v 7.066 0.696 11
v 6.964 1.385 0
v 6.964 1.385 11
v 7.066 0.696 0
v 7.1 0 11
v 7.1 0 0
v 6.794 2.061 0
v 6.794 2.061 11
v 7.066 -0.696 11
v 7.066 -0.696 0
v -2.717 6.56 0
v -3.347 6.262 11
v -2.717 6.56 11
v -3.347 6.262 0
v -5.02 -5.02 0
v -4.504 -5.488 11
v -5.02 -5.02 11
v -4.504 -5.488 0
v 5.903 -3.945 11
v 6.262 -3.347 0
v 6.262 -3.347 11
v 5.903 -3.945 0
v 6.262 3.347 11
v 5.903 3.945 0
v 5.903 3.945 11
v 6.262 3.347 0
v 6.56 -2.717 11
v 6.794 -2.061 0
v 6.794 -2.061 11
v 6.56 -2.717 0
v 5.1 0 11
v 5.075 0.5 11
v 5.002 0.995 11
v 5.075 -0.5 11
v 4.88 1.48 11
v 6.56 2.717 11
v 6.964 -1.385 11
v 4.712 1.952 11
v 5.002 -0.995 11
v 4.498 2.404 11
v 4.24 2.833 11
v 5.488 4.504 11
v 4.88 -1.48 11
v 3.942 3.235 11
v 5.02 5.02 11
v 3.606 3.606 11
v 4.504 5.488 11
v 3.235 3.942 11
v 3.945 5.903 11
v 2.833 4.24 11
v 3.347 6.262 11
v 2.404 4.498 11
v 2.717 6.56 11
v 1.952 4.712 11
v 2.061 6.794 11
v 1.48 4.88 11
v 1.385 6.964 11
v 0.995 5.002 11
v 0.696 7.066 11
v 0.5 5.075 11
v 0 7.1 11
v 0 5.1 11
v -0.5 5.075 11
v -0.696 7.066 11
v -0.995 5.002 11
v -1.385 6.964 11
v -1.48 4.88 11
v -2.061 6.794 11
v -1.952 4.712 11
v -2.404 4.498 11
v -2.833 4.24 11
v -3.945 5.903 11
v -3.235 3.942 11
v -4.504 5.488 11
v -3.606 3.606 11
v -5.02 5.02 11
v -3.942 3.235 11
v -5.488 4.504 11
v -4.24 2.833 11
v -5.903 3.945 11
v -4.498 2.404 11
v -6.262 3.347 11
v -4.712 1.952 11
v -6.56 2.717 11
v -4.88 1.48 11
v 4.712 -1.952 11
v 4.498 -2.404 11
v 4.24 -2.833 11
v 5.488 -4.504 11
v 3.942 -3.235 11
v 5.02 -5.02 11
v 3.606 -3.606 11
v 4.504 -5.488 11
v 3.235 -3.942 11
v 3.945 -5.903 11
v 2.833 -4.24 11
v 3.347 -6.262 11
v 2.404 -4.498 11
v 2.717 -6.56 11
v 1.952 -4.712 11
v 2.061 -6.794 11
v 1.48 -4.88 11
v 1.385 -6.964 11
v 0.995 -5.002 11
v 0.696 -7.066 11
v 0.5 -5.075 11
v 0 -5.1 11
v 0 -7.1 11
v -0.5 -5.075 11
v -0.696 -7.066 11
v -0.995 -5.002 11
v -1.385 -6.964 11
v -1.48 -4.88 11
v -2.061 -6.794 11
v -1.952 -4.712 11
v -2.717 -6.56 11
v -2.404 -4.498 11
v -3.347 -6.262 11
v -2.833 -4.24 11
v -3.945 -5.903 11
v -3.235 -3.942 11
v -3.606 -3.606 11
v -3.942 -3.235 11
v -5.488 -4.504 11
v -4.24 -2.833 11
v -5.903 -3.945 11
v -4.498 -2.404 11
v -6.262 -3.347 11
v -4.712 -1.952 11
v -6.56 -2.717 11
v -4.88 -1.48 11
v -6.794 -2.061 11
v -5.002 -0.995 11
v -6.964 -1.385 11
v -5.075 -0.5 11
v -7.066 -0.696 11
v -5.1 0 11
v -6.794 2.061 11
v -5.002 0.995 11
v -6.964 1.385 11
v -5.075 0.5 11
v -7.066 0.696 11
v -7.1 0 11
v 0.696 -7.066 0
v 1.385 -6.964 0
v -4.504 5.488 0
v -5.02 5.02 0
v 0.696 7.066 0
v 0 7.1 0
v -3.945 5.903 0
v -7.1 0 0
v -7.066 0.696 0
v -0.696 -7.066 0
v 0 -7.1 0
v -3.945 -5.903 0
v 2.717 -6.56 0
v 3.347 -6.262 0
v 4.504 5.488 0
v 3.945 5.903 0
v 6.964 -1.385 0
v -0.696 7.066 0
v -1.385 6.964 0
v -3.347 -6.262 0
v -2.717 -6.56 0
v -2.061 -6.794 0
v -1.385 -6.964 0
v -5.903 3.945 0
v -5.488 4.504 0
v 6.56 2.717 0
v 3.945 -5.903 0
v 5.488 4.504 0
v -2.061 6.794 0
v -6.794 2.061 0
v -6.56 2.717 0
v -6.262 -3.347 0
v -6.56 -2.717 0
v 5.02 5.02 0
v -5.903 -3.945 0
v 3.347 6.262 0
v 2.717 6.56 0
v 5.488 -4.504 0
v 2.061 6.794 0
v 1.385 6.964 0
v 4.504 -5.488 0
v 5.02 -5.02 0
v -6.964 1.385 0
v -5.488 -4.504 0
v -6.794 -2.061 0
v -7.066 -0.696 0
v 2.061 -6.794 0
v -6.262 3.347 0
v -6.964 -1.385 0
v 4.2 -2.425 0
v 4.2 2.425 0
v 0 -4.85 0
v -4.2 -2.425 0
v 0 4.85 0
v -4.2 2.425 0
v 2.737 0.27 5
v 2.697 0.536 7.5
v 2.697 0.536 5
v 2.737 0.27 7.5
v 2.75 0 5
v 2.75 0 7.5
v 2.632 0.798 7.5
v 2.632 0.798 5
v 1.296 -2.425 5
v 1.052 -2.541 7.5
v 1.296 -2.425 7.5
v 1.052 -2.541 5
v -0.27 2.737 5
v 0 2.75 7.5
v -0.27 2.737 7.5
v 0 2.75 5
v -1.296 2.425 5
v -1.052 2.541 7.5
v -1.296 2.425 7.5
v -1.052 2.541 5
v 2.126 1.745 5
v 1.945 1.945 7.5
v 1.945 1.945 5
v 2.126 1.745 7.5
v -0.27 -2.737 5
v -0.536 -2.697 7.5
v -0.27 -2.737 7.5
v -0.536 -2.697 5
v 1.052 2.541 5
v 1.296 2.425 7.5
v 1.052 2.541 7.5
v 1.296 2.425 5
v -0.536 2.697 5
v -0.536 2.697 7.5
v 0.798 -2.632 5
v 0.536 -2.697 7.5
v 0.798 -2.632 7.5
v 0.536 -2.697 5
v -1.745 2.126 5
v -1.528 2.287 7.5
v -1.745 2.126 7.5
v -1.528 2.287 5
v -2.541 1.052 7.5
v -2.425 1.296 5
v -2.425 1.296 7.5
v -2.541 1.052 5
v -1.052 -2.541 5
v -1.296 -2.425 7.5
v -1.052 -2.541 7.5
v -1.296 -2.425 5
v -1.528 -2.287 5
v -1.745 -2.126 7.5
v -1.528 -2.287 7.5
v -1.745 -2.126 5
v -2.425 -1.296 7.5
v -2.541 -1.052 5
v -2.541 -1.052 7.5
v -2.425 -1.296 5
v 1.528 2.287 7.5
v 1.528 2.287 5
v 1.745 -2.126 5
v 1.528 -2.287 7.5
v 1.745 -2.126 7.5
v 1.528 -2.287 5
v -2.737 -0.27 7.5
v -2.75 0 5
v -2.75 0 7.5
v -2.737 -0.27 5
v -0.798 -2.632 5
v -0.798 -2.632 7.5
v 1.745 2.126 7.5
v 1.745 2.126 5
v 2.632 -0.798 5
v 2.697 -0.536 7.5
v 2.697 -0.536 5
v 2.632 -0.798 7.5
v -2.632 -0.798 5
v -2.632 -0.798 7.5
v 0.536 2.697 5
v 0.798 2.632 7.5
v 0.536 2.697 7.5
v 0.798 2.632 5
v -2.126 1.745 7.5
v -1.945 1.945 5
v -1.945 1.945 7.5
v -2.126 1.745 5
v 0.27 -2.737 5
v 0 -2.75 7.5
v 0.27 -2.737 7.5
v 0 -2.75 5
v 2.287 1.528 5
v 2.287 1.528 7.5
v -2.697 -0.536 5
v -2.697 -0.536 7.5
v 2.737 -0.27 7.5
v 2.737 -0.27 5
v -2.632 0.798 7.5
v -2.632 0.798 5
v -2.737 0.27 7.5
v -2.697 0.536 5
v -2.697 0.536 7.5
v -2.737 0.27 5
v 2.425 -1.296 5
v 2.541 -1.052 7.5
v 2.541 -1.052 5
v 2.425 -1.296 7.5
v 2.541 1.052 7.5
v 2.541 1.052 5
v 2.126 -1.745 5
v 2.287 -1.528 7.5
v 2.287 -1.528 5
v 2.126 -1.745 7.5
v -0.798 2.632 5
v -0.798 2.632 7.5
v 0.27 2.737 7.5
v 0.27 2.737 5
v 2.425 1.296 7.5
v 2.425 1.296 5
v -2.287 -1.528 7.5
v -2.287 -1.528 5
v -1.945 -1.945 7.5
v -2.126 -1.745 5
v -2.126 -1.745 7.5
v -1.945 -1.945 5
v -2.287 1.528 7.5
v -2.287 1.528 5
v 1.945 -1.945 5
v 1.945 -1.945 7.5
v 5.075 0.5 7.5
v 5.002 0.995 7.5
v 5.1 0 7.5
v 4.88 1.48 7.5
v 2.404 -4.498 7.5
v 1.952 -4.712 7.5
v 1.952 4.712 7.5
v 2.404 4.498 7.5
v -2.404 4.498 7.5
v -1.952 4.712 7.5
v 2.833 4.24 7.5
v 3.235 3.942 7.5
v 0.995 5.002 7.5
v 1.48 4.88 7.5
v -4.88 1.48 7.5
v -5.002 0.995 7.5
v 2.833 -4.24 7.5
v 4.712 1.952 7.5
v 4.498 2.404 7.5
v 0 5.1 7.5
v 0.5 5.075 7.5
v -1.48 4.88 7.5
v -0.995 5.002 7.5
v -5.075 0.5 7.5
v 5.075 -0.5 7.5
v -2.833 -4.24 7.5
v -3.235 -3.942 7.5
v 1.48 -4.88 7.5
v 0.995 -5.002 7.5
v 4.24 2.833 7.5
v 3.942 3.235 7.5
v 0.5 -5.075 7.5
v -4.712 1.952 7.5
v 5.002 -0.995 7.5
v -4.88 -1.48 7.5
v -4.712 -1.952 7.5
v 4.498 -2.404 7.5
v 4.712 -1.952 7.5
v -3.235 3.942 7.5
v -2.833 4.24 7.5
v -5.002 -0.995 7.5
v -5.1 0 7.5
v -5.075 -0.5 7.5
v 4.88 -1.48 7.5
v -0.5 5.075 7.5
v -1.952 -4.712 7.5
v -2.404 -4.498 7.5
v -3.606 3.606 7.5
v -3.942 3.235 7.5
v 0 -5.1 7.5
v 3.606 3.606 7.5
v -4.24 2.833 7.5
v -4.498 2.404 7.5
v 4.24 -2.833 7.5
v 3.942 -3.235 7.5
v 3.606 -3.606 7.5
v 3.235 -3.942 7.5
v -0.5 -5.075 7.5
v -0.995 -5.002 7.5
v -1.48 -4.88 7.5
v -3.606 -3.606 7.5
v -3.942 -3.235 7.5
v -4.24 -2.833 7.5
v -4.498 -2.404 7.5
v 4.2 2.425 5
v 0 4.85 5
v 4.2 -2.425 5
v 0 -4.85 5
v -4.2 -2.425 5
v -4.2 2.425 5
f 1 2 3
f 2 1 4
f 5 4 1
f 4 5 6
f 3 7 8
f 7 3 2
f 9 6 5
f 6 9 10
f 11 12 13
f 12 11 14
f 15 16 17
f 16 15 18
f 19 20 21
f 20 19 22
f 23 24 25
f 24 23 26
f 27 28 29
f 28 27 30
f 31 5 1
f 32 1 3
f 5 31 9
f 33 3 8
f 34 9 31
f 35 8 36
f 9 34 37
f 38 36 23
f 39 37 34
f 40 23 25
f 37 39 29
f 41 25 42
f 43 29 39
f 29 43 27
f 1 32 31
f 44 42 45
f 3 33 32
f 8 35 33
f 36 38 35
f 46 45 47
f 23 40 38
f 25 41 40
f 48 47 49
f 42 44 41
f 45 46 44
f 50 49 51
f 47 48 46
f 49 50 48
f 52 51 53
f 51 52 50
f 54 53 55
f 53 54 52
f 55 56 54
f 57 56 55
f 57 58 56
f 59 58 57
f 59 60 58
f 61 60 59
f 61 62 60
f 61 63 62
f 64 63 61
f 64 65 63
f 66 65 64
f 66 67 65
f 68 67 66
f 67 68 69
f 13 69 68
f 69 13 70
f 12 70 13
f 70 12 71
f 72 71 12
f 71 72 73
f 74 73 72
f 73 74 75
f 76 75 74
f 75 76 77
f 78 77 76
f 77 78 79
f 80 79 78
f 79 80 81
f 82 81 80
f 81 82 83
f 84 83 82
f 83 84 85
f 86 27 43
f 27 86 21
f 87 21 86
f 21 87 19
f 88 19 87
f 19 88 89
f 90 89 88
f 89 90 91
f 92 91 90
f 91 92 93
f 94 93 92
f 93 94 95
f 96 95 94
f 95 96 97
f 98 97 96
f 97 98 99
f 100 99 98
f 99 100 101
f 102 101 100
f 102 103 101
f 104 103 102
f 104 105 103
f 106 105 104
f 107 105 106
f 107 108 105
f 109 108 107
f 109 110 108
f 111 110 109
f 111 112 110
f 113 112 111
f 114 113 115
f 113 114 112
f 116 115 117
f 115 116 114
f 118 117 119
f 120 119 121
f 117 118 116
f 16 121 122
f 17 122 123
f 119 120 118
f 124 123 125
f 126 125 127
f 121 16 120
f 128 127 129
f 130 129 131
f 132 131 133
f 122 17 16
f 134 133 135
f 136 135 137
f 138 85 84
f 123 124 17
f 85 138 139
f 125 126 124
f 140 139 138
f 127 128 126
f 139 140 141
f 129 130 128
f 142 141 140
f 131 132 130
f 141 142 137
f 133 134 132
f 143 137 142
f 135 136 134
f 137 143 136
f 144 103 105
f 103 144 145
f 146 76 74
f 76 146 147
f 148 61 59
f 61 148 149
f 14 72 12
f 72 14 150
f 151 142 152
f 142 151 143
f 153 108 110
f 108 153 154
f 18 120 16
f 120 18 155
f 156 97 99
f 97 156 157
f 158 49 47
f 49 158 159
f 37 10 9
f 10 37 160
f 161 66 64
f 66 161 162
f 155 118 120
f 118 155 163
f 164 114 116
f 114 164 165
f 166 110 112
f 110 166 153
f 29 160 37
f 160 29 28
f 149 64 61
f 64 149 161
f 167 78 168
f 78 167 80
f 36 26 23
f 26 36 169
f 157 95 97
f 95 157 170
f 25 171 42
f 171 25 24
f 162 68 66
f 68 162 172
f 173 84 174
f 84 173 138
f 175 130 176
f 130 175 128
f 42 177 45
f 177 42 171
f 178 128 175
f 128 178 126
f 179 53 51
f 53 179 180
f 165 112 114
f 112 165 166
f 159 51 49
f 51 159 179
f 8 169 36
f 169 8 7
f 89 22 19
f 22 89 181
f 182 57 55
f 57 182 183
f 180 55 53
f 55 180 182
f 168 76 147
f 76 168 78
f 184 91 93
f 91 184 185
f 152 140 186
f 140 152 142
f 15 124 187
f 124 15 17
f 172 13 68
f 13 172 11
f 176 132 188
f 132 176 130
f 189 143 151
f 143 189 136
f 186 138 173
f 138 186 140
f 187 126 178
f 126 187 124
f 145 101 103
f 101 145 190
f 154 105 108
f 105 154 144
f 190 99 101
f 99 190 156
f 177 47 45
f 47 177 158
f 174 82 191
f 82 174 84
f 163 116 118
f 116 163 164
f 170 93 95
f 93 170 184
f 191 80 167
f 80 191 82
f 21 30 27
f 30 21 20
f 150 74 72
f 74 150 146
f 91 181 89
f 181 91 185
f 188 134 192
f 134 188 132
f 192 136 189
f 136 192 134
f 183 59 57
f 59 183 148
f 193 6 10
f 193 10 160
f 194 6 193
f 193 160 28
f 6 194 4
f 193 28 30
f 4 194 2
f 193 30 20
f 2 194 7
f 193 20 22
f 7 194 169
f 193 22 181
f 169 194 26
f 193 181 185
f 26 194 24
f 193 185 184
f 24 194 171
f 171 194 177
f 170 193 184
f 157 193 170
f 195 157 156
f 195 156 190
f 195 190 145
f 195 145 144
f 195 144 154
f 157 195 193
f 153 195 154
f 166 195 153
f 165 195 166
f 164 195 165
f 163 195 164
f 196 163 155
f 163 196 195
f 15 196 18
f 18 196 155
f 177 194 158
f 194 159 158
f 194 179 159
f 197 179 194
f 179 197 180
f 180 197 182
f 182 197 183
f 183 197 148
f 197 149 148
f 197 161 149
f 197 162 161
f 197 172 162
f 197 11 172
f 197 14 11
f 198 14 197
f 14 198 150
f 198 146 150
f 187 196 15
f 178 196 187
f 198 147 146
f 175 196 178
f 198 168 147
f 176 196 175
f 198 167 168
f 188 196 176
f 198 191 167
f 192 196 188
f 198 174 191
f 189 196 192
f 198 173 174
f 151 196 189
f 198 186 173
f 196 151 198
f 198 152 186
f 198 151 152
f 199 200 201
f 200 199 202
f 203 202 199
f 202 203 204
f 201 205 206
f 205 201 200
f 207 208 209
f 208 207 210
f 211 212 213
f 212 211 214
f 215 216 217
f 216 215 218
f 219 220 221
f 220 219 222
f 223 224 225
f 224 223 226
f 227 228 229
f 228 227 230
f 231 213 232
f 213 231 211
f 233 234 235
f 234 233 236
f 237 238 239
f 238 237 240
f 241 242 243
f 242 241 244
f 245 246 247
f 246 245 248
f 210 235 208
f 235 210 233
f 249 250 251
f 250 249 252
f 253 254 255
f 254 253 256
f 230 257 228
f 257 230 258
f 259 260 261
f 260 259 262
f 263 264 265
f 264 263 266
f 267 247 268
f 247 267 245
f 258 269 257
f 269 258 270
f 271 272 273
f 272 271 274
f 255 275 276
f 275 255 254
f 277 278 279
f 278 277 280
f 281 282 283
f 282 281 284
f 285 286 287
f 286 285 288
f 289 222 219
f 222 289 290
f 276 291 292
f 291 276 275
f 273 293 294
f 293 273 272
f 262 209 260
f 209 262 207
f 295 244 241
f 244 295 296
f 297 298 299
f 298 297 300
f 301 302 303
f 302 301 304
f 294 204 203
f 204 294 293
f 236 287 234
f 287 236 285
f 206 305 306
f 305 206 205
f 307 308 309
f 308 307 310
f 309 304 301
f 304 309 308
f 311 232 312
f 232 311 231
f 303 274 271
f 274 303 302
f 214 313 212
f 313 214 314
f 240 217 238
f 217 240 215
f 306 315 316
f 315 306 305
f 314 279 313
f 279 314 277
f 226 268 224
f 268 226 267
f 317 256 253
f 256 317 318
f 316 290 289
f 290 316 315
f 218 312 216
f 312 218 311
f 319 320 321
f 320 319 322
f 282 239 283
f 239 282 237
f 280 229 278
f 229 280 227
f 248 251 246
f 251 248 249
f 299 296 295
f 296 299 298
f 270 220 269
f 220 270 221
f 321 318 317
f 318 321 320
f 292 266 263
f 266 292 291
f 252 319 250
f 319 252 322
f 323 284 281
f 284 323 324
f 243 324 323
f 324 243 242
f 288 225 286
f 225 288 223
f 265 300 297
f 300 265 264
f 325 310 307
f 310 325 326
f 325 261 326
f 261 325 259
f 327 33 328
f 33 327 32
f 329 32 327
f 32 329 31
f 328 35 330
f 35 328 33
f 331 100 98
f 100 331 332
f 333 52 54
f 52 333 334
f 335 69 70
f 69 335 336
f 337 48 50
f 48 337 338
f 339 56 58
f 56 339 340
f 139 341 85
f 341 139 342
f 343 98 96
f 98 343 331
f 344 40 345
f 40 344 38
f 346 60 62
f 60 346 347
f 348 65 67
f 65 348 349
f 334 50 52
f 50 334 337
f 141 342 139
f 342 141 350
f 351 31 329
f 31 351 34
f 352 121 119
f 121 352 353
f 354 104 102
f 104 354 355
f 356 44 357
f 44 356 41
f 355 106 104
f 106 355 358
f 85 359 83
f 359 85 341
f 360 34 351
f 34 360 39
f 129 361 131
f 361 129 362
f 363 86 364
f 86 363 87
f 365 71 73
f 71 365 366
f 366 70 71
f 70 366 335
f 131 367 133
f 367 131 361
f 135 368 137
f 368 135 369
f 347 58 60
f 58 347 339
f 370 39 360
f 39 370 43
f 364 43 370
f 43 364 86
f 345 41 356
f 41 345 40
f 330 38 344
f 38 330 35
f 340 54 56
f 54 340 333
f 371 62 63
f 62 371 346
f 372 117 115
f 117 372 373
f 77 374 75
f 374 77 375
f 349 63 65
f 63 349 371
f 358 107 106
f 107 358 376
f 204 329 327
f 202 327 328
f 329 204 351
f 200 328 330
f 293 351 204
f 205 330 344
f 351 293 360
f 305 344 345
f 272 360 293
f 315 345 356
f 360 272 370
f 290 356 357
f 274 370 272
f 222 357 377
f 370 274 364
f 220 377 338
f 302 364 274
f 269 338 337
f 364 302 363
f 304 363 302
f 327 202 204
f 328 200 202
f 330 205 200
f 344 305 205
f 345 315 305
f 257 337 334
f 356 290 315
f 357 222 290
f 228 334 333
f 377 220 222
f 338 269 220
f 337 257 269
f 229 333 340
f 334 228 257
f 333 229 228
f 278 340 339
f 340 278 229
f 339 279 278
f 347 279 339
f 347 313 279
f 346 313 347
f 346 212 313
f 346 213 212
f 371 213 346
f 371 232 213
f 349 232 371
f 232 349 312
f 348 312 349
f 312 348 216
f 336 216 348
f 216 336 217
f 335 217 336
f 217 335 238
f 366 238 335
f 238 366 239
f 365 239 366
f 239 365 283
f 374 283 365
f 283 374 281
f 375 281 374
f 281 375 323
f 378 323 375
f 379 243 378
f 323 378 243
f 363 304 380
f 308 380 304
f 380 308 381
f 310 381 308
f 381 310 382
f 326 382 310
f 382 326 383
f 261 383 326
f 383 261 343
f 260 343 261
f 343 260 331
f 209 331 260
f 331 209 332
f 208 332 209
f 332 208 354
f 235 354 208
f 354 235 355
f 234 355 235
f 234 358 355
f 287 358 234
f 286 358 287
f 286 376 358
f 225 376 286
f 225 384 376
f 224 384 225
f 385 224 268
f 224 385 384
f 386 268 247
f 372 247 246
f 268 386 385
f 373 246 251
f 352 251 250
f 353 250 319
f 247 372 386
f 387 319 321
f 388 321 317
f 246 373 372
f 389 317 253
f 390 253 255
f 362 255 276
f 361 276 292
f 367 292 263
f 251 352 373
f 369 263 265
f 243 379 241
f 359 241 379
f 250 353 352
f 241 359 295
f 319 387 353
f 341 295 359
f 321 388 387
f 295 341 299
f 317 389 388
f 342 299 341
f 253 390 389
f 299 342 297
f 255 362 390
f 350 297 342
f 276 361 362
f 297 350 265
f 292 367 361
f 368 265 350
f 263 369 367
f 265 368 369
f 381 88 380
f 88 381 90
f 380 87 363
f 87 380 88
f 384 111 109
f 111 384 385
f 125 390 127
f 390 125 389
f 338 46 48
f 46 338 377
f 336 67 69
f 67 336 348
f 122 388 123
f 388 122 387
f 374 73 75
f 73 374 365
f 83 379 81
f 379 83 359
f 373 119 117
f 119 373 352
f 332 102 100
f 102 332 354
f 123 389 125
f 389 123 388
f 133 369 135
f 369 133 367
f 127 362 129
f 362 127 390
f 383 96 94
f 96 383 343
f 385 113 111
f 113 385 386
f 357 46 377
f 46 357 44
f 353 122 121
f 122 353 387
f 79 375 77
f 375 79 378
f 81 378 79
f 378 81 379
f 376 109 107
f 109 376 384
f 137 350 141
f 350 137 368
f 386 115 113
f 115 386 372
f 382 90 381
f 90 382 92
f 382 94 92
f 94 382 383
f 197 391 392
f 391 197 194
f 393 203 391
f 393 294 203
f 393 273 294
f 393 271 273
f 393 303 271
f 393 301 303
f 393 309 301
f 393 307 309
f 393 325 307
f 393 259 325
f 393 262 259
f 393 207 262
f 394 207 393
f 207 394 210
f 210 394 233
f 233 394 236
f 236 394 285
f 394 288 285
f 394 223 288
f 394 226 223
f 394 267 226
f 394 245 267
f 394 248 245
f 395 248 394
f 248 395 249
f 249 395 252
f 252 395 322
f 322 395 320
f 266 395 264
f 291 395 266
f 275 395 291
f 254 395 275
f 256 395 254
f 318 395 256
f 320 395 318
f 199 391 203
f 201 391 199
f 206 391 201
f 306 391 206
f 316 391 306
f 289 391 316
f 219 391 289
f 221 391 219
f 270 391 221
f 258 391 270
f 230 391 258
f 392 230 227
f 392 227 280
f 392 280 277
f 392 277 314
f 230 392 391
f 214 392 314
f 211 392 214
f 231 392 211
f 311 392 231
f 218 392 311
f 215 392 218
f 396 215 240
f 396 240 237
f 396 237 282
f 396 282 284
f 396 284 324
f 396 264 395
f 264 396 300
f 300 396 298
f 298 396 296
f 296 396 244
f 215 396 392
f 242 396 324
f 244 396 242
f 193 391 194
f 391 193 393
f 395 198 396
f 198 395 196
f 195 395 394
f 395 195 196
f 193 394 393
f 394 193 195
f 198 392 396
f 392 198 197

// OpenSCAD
// file: settings.scad
// Shared OpenScad configuration for building a stacked mounting adapter
// that packages the following devices:
//
// * Top: A IR LED ring light
// * Mid: A IR BandPass filter that allows light through
// * Bot: A Raspberry Pi NoIR camera v2.1 that allows IR light through to sensor
//
// This file contains settings for the mounting hardware

// Diameter (in mm) of your custom mounting hardware (to attach your
// devices together). 3.0 mm works for 2.5M bolts (and probably #4).
bolt_hole_diameter = 3.0;

// The diameter for any counter sunk holes for bolt heads
bolt_head_diameter = 5.25;

// The depth to counter sink holes for bolt heads
bolt_head_depth = 2.5;

// The width measured using calipers across two flat edges plus
// some room depending on your printer (maybe 0.25 to 0.5)
nut_width = 5.25;

// The minimum depth to counter sink a hex hole for a nut
nut_depth = 2.25;


plate_diameter = 78;
plate_holes = 24;
plate_holes_diameter = 70;

// The minimum acceptable plate thickness (in mm) you want
// when two plates come together to be bolted.
plate_thickness = 1.5;

// How many rotated positions do you want for your mounting holes (integer).
num_angles = 4;

// Detail to use when drawing circles/arcs (higher values look more like
// circles but take longer to render)
$fn = 16;
// main file
//
// Quick rendering that you can quickly print to double check your
// settings for nut, bolt heads and bolt holes used to build
// the IR + BandFilter + PI Camera casing
//

include <common.scad>;

//
// Create a cylinder with a hole drilled through it
// and a cylinder cutout for the head and hex cut out for the nut.
//
// h - Height of cylinder to create
// br - Bolt radius (to drill through hole)
// bhr - Bolt head radius for counter-sinking bolt head
// bhd - Depth of counter sink for bolt head
// nr - Radius of nut (to corner of hex cut out)
// nd - Depth to counter sink nut
module testHole(h, br, bhr, bhd, nr, nd) {
    out_r = max(nr, bhr) + 2;
    difference() {
        cylinder(h, out_r, out_r);
        cylinder(h, br, br);
        translate([0, 0, h - bhd]) cylinder(bhd, bhr, bhr);
        hex_hole(nr, nd);
    }
}

// Creates a test hole using bolt settings from settings.scad
// Hole will have:
// - A counter sink for the bolt head
// - A bolt hole for the shaft of the bolt (will be bolt_depth long)
// - A counter sunk hex hole for the nut
/*
module testHole(bolt_depth) {
    $fn = 64;
    difference() {
        cylinder(nut_depth + bolt_depth + bolt_head_depth, nut_r + 2, nut_r + 2);
        cylinder(nut_depth + bolt_depth + bolt_head_depth, bolt_hole_r, bolt_hole_r);
        translate([0, 0, nut_depth + bolt_depth]) cylinder(bolt_head_depth, bolt_head_r, bolt_head_r);
        hex_hole(nut_r, nut_depth);
    }
}
*/

// Increase resolution
$fn = 64;
// Create small test hole to put bolt and nut in
//h = nut_depth + bolt_head_depth + 2.5;
//testHole(h, bolt_hole_r, bolt_head_r, bolt_head_depth, nut_r, nut_depth);

m5_hole_diameter = 5.5;
m5_head_diameter = 10.2;
m5_head_depth = 3.5;
m5_nut_size = 8.4;
m5_nut_depth = 5;

m5_hole_r = m5_hole_diameter / 2;
m5_head_r = m5_head_diameter / 2;
m5_nut_r = (m5_nut_size / 2) / cos(30);

h = m5_nut_depth + m5_head_depth + 2.5;
testHole(h, m5_hole_r, m5_head_r, m5_head_depth, m5_nut_r, m5_nut_depth);
